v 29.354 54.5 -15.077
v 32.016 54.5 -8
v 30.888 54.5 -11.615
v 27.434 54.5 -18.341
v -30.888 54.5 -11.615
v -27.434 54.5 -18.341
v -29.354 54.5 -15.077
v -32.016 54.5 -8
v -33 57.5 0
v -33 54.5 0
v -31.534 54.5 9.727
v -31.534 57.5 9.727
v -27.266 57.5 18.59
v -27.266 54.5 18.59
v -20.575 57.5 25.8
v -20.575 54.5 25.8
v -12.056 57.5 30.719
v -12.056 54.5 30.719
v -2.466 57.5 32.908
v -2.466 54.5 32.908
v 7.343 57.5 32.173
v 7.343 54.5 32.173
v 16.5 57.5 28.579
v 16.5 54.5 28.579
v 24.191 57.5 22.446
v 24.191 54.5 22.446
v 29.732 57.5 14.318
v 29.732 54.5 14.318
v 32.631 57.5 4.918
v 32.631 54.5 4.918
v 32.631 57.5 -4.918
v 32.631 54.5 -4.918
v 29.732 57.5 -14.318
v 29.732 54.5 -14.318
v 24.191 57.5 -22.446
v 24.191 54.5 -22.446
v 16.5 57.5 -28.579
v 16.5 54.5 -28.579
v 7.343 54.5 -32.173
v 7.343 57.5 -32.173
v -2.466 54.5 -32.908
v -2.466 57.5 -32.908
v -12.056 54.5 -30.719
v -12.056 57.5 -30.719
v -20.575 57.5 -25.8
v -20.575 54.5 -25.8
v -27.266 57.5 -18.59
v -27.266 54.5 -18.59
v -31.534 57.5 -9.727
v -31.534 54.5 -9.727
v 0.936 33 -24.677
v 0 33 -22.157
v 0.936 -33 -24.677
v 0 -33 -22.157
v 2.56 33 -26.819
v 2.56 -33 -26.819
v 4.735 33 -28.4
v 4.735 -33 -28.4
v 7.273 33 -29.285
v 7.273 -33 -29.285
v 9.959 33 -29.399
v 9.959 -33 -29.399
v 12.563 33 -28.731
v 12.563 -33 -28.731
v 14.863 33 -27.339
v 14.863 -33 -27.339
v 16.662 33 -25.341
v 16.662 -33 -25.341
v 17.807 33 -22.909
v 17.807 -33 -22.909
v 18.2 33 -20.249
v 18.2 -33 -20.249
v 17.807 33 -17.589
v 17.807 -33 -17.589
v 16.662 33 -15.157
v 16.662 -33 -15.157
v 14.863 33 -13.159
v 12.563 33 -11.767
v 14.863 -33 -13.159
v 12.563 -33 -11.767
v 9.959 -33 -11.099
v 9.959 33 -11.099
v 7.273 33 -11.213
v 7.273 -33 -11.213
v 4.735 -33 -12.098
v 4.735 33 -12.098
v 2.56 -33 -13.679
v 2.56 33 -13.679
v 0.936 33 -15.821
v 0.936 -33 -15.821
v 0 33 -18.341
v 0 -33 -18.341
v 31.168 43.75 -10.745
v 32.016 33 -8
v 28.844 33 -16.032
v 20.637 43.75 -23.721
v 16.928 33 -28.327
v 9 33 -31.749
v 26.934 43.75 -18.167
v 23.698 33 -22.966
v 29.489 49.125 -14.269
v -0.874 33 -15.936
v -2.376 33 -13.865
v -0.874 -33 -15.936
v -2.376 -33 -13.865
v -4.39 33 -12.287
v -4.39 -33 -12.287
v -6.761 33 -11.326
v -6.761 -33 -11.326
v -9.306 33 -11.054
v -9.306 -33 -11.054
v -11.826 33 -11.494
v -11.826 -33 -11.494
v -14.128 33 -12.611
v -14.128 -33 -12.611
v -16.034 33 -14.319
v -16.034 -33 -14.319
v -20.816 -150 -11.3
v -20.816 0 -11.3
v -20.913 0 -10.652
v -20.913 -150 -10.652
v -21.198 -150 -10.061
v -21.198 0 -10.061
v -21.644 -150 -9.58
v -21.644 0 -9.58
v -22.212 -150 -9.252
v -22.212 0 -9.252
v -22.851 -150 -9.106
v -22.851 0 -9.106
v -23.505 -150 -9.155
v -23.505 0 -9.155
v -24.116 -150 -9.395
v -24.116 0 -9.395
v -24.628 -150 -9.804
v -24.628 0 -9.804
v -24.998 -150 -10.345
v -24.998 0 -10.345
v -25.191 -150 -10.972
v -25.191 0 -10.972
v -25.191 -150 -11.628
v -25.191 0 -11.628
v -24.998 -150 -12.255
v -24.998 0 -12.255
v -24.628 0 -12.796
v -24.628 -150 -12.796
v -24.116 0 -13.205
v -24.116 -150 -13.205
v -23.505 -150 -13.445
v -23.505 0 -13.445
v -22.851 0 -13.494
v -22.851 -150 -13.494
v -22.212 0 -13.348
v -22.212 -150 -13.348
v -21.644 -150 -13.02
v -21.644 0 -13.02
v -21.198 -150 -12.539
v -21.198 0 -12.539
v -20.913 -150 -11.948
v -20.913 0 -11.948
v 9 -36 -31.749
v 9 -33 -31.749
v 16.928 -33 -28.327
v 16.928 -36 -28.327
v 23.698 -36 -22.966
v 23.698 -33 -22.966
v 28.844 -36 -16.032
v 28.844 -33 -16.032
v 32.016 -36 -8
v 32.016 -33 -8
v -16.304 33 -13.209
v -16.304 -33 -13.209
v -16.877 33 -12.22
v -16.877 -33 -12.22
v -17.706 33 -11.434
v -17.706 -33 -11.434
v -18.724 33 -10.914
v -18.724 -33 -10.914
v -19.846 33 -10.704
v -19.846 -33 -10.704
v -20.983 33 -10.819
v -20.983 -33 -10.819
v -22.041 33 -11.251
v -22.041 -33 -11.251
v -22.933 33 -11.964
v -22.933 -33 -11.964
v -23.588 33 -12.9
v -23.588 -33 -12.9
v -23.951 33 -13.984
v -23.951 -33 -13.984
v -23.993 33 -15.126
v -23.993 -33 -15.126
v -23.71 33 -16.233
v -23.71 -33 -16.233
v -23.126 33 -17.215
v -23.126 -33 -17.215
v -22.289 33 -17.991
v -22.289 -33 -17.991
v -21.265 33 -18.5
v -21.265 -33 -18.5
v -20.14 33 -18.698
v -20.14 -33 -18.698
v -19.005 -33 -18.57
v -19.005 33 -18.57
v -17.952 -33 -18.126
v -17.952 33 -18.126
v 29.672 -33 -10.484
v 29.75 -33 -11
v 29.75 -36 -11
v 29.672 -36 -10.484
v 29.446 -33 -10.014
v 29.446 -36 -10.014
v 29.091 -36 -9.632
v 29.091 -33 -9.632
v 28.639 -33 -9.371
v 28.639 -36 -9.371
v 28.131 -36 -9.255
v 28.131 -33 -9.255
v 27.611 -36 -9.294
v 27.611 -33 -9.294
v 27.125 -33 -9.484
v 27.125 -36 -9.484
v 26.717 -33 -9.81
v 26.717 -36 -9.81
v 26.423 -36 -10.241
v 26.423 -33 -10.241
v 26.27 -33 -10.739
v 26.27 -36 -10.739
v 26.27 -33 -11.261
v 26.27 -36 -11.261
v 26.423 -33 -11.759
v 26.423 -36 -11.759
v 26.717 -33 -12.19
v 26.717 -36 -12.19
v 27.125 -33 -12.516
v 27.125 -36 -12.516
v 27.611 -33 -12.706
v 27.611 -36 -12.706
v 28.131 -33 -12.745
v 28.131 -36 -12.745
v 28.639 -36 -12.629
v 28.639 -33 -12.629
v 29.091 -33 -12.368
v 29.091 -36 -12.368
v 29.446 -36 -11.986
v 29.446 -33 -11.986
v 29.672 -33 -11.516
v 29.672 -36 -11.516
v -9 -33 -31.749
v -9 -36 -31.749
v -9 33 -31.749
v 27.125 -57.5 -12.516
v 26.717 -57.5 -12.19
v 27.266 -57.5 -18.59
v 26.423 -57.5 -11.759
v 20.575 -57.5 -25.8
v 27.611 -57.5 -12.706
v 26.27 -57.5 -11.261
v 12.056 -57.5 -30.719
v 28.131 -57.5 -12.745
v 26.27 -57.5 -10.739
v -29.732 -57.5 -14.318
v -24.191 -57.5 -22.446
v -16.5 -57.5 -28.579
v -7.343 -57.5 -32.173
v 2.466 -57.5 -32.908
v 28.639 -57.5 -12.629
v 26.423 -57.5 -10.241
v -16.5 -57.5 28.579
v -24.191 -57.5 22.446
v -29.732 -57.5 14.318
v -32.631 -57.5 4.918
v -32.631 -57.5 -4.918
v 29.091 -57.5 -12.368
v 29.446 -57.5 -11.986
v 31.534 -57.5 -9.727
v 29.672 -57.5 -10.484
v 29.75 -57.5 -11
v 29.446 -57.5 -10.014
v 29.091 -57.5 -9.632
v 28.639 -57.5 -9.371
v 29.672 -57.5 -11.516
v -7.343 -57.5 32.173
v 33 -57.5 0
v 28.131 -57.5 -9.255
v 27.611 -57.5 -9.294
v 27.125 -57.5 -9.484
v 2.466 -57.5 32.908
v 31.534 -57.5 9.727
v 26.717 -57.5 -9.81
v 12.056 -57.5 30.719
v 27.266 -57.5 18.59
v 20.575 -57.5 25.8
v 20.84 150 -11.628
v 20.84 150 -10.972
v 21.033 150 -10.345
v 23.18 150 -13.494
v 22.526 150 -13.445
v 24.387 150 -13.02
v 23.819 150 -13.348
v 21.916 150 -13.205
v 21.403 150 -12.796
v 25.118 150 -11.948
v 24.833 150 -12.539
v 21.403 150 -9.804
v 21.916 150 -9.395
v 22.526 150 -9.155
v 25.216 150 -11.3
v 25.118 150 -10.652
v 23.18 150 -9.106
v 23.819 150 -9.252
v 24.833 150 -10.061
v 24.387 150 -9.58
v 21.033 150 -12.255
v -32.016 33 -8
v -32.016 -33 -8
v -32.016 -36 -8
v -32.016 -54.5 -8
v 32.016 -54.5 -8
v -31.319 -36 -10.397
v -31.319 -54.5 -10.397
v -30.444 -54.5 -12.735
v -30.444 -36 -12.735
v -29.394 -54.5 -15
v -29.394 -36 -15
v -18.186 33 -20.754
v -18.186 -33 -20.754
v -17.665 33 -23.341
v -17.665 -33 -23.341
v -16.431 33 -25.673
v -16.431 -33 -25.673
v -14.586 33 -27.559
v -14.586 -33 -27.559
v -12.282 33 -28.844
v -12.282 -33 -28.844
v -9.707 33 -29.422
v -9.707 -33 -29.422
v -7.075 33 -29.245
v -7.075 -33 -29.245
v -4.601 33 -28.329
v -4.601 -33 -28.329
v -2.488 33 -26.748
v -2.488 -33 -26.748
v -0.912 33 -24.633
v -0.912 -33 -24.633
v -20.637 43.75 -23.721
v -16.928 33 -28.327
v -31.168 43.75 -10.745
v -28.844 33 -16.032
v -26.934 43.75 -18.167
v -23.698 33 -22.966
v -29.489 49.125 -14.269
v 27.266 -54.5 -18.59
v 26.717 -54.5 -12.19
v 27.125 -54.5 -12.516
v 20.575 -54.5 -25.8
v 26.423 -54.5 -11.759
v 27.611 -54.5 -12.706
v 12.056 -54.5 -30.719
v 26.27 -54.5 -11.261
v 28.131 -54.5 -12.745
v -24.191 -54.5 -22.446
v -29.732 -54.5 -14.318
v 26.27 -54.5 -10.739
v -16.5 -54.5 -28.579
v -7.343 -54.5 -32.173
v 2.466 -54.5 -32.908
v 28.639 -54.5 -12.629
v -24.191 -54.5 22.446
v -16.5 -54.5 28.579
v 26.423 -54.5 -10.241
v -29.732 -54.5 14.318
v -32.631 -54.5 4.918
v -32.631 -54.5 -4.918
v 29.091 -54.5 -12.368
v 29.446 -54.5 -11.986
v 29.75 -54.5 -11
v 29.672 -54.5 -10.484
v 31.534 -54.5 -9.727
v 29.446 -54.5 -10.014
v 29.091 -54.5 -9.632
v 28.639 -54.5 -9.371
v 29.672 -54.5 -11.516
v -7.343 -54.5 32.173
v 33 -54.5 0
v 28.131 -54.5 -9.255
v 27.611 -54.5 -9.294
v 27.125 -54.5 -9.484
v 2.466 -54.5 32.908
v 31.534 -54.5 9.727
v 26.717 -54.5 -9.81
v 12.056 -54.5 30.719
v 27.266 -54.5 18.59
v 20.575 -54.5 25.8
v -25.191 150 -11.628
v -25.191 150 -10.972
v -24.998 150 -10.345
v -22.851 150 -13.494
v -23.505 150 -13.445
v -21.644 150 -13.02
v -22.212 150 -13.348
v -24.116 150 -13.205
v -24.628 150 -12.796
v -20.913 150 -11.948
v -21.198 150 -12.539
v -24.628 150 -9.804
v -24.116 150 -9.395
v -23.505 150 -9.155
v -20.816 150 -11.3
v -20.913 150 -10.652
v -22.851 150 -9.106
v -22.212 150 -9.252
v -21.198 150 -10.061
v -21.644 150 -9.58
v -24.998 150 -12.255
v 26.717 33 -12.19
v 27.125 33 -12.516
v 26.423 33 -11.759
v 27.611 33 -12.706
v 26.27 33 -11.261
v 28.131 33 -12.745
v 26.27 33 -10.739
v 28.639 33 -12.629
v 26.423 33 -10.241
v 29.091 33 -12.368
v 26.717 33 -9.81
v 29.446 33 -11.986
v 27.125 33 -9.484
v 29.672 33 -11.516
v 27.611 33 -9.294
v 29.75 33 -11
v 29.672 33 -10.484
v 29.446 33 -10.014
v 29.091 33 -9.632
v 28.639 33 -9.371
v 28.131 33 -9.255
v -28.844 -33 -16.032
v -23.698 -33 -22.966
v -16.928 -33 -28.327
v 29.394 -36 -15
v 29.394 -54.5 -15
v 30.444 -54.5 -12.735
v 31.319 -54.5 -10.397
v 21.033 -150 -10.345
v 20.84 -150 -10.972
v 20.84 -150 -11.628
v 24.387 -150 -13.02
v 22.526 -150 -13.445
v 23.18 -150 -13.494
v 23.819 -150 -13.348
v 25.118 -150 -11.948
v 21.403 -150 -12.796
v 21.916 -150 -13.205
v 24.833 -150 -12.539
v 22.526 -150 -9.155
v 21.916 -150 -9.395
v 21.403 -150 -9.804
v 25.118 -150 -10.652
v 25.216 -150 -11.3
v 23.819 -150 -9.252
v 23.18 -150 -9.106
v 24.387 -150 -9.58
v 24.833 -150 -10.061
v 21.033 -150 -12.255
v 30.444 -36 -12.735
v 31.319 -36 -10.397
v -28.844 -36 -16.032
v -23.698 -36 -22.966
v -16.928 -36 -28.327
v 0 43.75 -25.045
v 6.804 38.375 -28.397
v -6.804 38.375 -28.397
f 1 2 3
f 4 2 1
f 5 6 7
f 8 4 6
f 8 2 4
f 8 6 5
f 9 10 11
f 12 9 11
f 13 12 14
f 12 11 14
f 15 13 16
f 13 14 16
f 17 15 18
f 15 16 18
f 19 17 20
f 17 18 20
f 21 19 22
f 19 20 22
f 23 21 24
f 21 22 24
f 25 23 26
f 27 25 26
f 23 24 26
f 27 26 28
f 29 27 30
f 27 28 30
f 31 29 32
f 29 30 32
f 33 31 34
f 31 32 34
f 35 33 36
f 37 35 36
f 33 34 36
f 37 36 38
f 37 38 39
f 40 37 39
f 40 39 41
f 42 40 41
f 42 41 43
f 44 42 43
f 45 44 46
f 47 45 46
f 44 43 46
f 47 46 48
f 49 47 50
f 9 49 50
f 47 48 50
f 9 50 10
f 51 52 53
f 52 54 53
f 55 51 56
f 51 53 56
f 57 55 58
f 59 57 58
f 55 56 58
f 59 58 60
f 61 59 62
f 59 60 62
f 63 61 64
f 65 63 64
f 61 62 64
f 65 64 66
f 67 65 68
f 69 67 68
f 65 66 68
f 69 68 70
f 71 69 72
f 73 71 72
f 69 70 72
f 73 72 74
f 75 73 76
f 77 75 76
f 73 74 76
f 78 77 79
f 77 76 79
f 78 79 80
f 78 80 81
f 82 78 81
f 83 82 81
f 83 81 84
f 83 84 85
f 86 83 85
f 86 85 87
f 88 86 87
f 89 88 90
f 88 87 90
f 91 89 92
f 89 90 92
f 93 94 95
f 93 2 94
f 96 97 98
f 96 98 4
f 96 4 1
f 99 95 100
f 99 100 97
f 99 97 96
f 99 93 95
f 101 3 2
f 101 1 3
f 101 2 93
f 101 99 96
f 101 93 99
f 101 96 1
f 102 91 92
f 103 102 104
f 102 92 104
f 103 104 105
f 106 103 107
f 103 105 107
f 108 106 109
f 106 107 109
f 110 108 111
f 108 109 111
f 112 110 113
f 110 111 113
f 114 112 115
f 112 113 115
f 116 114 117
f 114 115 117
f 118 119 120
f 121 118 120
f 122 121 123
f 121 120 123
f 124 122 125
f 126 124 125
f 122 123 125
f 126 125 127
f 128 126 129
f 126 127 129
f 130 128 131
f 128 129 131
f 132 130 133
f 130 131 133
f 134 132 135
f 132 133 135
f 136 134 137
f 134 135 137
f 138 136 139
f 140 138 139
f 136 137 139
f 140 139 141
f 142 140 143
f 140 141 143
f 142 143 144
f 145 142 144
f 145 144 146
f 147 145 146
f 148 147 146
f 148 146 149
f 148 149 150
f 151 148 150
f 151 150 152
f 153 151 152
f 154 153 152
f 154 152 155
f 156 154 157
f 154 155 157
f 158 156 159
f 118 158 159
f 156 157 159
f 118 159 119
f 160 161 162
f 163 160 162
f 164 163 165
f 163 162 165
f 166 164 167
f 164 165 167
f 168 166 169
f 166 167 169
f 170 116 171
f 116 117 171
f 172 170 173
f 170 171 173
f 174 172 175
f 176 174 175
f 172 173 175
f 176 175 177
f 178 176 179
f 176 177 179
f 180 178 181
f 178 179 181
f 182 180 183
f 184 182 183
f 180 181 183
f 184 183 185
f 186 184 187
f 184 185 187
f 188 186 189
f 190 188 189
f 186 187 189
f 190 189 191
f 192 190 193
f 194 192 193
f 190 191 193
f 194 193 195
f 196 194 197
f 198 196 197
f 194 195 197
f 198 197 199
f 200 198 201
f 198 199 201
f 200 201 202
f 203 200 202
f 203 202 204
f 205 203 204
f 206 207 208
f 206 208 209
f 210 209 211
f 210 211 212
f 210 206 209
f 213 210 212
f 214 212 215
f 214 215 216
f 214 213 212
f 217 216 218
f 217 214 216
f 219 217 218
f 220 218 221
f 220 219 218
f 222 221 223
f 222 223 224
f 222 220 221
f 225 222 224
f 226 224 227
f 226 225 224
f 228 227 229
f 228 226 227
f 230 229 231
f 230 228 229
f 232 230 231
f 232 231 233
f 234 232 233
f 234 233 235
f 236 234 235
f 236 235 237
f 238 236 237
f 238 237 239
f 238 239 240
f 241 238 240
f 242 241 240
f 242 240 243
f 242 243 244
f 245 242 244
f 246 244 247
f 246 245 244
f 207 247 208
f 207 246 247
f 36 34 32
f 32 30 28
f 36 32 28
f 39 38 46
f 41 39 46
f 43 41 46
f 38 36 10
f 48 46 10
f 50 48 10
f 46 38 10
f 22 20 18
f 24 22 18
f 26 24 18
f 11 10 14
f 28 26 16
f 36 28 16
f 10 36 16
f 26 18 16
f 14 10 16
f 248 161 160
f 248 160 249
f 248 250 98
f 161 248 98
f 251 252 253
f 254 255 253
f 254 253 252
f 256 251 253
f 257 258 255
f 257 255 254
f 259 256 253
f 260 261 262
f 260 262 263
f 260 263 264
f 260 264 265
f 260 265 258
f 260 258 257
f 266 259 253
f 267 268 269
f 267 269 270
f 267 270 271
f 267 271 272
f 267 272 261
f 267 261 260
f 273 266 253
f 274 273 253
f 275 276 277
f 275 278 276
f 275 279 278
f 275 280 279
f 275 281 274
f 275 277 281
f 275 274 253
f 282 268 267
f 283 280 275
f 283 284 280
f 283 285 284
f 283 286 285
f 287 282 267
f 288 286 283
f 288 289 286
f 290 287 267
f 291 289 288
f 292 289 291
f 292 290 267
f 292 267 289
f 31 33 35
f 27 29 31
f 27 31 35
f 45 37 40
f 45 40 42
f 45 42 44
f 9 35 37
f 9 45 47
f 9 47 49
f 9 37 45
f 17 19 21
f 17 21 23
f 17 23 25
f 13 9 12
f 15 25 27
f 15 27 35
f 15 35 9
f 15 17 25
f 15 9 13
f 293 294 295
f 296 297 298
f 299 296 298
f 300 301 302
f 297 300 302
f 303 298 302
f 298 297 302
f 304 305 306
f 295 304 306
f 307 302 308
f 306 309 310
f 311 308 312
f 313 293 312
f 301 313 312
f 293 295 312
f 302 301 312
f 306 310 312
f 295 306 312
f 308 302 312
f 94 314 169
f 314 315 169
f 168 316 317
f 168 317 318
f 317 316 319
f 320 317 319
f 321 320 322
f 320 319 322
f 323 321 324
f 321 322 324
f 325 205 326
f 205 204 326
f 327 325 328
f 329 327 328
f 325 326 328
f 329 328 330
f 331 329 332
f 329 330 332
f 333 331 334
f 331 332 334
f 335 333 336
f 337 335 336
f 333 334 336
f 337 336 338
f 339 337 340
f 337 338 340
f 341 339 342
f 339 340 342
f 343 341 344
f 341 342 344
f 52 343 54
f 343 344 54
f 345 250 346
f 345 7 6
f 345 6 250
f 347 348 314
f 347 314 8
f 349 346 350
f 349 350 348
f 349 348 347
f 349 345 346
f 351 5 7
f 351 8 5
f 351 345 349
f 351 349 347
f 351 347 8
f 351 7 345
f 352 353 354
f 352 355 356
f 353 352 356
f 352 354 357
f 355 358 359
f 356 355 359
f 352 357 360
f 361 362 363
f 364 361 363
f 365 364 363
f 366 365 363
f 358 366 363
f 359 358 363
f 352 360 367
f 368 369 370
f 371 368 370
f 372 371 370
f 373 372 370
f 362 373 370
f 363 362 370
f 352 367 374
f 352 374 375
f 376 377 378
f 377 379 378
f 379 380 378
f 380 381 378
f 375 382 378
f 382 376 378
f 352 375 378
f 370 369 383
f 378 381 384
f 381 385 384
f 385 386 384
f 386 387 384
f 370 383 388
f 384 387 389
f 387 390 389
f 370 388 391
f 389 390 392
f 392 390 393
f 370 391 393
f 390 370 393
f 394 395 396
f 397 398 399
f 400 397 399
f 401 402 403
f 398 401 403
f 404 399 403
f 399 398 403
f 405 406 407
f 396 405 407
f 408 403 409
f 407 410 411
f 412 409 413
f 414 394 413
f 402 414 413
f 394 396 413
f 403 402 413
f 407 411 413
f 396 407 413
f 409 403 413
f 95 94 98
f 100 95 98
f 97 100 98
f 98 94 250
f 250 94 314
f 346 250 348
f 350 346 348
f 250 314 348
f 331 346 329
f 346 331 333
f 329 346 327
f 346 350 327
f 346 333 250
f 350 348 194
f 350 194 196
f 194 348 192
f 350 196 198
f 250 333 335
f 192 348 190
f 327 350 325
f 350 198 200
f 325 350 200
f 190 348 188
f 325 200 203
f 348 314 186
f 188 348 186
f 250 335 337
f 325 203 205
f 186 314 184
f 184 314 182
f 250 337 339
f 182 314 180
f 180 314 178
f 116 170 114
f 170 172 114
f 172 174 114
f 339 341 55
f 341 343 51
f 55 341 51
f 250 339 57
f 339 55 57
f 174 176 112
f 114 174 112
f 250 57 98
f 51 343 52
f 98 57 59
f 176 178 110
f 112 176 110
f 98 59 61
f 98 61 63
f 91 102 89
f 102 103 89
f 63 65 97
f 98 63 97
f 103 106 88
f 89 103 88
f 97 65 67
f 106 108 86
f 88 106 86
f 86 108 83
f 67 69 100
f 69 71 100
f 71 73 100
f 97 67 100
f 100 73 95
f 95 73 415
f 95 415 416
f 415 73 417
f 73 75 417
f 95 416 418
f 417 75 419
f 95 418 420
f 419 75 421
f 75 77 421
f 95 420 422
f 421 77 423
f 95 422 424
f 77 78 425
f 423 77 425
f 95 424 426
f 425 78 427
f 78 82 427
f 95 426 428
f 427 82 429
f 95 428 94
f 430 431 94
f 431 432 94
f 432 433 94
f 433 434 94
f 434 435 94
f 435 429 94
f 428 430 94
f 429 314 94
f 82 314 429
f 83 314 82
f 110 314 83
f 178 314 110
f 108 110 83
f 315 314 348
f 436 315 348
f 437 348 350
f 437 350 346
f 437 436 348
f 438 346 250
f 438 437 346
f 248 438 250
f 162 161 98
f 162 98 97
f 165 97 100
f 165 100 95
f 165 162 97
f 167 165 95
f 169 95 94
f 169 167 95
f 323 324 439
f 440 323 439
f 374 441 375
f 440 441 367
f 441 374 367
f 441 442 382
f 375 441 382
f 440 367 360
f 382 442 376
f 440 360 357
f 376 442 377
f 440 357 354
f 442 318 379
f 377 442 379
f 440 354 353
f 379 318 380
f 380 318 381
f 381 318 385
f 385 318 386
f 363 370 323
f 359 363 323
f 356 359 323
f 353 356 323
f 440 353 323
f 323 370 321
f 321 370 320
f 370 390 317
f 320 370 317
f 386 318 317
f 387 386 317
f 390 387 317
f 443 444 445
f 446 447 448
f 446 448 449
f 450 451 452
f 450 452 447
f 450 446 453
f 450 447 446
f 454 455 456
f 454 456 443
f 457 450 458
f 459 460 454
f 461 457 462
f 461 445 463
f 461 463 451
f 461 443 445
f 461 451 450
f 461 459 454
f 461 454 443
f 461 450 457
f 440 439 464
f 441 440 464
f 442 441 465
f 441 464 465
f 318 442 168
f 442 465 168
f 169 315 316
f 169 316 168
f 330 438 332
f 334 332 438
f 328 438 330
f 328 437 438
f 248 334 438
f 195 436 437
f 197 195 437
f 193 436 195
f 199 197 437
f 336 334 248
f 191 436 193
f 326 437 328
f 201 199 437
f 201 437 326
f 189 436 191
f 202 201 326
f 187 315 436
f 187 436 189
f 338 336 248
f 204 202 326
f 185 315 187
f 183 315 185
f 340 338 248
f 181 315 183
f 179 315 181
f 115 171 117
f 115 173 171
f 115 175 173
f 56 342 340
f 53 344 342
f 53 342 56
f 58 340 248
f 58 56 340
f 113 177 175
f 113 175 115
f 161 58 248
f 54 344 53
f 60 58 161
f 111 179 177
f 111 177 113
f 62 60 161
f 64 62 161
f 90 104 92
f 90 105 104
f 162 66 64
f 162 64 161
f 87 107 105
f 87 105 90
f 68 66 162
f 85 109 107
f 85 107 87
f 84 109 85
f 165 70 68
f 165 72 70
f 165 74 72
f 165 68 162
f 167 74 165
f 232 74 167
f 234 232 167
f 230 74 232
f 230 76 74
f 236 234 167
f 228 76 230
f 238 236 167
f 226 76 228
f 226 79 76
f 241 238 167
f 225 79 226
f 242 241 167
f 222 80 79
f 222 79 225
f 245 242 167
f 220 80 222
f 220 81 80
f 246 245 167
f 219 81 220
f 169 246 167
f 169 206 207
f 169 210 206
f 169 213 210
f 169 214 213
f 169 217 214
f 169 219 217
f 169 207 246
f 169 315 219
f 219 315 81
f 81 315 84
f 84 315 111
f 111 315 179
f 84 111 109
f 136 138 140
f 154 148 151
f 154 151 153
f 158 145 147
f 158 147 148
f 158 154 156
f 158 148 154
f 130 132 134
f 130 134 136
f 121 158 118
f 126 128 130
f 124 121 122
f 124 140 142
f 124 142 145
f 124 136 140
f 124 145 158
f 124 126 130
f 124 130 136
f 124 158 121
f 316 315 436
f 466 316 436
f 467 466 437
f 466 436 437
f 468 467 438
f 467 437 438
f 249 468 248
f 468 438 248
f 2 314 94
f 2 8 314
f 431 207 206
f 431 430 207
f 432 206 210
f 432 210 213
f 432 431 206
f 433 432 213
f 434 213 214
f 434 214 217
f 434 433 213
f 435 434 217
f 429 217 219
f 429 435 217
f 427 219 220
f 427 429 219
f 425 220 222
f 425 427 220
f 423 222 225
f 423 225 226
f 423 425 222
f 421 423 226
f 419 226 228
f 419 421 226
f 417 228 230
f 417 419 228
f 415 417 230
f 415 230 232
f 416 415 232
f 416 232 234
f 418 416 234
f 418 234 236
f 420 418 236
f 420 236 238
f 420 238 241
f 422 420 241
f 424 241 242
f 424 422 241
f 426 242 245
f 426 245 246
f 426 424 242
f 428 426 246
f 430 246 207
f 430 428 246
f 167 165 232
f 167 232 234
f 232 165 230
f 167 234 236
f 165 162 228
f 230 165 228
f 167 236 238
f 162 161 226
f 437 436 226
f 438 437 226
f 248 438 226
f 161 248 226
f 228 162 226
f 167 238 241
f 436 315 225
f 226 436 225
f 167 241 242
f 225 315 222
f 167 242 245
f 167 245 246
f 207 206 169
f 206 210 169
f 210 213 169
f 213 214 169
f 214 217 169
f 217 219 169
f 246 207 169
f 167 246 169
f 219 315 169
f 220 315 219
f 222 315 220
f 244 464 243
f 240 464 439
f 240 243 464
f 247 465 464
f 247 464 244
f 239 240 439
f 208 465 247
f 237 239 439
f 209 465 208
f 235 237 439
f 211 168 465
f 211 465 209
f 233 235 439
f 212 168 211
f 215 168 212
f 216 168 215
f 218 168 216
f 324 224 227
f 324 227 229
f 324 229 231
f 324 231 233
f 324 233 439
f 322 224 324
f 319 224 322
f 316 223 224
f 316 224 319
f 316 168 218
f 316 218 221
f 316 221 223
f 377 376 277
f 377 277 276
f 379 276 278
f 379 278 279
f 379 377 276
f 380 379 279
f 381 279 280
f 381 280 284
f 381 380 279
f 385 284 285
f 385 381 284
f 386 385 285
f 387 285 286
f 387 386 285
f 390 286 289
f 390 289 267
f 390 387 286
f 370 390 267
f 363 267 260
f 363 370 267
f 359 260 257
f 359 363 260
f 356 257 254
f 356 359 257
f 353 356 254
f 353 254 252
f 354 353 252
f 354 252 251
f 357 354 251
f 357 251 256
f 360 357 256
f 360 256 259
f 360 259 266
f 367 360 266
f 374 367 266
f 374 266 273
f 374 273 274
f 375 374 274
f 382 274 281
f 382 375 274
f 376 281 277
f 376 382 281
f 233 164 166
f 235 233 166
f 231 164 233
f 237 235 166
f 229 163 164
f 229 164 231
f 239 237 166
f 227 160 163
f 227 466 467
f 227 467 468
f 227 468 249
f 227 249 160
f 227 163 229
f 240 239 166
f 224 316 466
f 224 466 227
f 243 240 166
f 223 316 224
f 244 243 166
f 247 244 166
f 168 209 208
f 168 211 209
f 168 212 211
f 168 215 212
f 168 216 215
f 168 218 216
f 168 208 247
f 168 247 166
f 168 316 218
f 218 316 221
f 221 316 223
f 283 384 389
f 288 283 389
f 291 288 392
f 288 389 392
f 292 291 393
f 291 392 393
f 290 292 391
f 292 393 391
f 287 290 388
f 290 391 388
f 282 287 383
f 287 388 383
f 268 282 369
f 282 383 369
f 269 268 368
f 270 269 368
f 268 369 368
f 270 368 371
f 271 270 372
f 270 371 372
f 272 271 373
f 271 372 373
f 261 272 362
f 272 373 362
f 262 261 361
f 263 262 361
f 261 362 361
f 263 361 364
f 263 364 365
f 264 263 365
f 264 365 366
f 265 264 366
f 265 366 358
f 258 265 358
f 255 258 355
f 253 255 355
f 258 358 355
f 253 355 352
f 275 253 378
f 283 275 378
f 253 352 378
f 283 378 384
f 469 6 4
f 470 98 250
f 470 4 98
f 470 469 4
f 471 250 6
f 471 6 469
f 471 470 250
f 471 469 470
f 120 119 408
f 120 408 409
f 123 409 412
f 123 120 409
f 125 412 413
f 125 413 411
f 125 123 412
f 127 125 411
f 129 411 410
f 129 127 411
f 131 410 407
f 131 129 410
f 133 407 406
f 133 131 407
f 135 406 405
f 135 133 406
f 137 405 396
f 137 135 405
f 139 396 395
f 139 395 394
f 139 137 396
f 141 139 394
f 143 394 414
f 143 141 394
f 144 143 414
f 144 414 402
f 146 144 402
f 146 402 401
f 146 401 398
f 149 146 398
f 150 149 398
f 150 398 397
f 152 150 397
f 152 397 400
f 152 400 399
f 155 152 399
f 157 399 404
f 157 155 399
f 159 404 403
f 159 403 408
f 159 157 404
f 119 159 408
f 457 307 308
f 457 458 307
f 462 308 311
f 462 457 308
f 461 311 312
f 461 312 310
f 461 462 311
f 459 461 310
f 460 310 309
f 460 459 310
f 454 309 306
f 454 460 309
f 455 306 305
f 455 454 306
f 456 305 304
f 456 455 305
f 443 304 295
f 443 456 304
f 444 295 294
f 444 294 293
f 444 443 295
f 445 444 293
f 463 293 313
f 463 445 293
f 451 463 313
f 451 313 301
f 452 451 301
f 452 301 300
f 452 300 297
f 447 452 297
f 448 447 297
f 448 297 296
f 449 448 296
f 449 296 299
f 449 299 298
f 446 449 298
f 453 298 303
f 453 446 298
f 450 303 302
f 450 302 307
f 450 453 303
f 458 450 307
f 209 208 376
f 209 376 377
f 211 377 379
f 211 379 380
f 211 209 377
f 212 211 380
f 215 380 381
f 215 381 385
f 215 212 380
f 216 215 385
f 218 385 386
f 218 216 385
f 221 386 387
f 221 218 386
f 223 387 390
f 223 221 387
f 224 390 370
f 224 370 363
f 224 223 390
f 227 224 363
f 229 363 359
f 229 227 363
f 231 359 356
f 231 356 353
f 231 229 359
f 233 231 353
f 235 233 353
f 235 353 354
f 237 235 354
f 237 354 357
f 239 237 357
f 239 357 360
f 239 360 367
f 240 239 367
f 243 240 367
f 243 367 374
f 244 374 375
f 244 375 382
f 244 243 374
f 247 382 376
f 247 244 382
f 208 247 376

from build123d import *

# Parameters (mm, degrees)
SKETCH_R         = 1.75
EXTRUDE_DEPTH    = 33
SKETCH001_R      = 1.75
EXTRUDE002_DEPTH = 3
SKETCH002_R      = 1.75
EXTRUDE004_DEPTH = 18.5
SKETCH003_R      = 33
SKETCH003_R_2    = 1.75
EXTRUDE005_DEPTH = 3
SKETCH007_R      = 33
EXTRUDE006_DEPTH = 3
SKETCH004_R      = 2.2
EXTRUDE007_DEPTH = 150


with BuildPart() as habitaculo_pilas:
    # Sketch → Extrude (new body, symmetric)
    with BuildSketch(Plane.XZ):
        with BuildLine():
            Line((-9, -31.749016), (9, -31.749016))
            ThreePointArc((9, -31.749016), (23.697558, -22.965752), (32.015621, -8))
            Line((-32.015621, -8), (32.015621, -8))
            ThreePointArc((-32.015621, -8), (-23.697558, -22.965752), (-9, -31.749016))
        make_face()
        with Locations((28, -11)):
            Circle(SKETCH_R, mode=Mode.SUBTRACT)
        with BuildLine():
            ThreePointArc((0, -18.341137), (-6.761487, -11.325504), (-16.033811, -14.318965))
            ThreePointArc((-16.033811, -14.318965), (-23.587969, -12.900463), (-17.951803, -18.126464))
            ThreePointArc((-17.951803, -18.126464), (-11.015359, -29.225559), (0, -22.156894))
            ThreePointArc((0, -22.156894), (18.2, -20.249016), (0, -18.341137))
        make_face(mode=Mode.SUBTRACT)
    extrude(amount=EXTRUDE_DEPTH, both=True)


with BuildPart() as tapapilas:
    # Sketch001 (on Face1 of Binder) → Extrude002 (new body)
    with BuildSketch(Plane.XZ.offset(33)):
        with BuildLine():
            ThreePointArc((9, -31.749016), (23.697558, -22.965752), (32.015621, -8))
            Line((-32.015621, -8), (32.015621, -8))
            ThreePointArc((-32.015621, -8), (-23.697558, -22.965752), (-9, -31.749016))
            Line((9, -31.749016), (-9, -31.749016))
        make_face()
        with Locations((28, -11)):
            Circle(SKETCH001_R, mode=Mode.SUBTRACT)
    extrude(amount=EXTRUDE002_DEPTH)


with BuildPart() as pieza_laterala:
    # Sketch002 (on Face1 of Binder001) → Extrude004 (new body)
    with BuildSketch(Plane.XZ.offset(36)):
        with BuildLine():
            Line((-32.015621, -8), (32.015621, -8))
            ThreePointArc((29.393877, -15), (30.903586, -11.574471), (32.015621, -8))
            Line((-29.393877, -15), (29.393877, -15))
            ThreePointArc((-32.015621, -8), (-30.903586, -11.574471), (-29.393877, -15))
        make_face()
        with Locations((28, -11)):
            Circle(SKETCH002_R, mode=Mode.SUBTRACT)
    extrude(amount=EXTRUDE004_DEPTH)


with BuildPart() as tapalaterala:
    # Sketch003 (on Face1 of Binder002) → Extrude005 (new body)
    with BuildSketch(Plane.XZ.offset(54.5)):
        Circle(SKETCH003_R)
        with Locations((28, -11)):
            Circle(SKETCH003_R_2, mode=Mode.SUBTRACT)
    extrude(amount=EXTRUDE005_DEPTH)


with BuildPart() as loft_body:
    # Sketch005 (on Face1 of Binder003) → Loft section 0
    with BuildSketch(Plane(origin=(0, 33, 0), x_dir=(-1, 0, 0), z_dir=(0, 1, 0))):
        with BuildLine():
            ThreePointArc((9, -31.749016), (23.697558, -22.965752), (32.015621, -8))
            Line((-32.015621, -8), (32.015621, -8))
            ThreePointArc((-32.015621, -8), (-23.697558, -22.965752), (-9, -31.749016))
            Line((9, -31.749016), (-9, -31.749016))
        make_face()
    # Sketch006 → Loft section 1
    with BuildSketch(Plane(origin=(0, 54.5, 0), x_dir=(-1, 0, 0), z_dir=(0, 1, 0))):
        with BuildLine():
            Line((-32.015621, -8), (32.015621, -8))
            ThreePointArc((27.433605, -18.341137), (30.17097, -13.368343), (32.015621, -8))
            Line((-27.433605, -18.341137), (27.433605, -18.341137))
            ThreePointArc((-32.015621, -8), (-30.17097, -13.368343), (-27.433605, -18.341137))
        make_face()
    loft()


with BuildPart() as tapalateralb:
    # Sketch007 (on Face6 of Loft) → Extrude006 (new body)
    with BuildSketch(Plane(origin=(0, 54.5, 0), x_dir=(-1, 0, 0), z_dir=(0, 1, 0))):
        Circle(SKETCH007_R)
    extrude(amount=EXTRUDE006_DEPTH)


with BuildPart() as taladros:
    # Sketch004 → Extrude007 (new body, symmetric)
    with BuildSketch(Plane.XZ):
        with Locations((-23.015621, -11.3)):
            Circle(SKETCH004_R)
        with Locations((23.015621, -11.3)):
            Circle(SKETCH004_R)
    extrude(amount=EXTRUDE007_DEPTH, both=True)


solid = Compound([habitaculo_pilas.part, tapapilas.part, pieza_laterala.part, tapalaterala.part, loft_body.part, tapalateralb.part, taladros.part])
